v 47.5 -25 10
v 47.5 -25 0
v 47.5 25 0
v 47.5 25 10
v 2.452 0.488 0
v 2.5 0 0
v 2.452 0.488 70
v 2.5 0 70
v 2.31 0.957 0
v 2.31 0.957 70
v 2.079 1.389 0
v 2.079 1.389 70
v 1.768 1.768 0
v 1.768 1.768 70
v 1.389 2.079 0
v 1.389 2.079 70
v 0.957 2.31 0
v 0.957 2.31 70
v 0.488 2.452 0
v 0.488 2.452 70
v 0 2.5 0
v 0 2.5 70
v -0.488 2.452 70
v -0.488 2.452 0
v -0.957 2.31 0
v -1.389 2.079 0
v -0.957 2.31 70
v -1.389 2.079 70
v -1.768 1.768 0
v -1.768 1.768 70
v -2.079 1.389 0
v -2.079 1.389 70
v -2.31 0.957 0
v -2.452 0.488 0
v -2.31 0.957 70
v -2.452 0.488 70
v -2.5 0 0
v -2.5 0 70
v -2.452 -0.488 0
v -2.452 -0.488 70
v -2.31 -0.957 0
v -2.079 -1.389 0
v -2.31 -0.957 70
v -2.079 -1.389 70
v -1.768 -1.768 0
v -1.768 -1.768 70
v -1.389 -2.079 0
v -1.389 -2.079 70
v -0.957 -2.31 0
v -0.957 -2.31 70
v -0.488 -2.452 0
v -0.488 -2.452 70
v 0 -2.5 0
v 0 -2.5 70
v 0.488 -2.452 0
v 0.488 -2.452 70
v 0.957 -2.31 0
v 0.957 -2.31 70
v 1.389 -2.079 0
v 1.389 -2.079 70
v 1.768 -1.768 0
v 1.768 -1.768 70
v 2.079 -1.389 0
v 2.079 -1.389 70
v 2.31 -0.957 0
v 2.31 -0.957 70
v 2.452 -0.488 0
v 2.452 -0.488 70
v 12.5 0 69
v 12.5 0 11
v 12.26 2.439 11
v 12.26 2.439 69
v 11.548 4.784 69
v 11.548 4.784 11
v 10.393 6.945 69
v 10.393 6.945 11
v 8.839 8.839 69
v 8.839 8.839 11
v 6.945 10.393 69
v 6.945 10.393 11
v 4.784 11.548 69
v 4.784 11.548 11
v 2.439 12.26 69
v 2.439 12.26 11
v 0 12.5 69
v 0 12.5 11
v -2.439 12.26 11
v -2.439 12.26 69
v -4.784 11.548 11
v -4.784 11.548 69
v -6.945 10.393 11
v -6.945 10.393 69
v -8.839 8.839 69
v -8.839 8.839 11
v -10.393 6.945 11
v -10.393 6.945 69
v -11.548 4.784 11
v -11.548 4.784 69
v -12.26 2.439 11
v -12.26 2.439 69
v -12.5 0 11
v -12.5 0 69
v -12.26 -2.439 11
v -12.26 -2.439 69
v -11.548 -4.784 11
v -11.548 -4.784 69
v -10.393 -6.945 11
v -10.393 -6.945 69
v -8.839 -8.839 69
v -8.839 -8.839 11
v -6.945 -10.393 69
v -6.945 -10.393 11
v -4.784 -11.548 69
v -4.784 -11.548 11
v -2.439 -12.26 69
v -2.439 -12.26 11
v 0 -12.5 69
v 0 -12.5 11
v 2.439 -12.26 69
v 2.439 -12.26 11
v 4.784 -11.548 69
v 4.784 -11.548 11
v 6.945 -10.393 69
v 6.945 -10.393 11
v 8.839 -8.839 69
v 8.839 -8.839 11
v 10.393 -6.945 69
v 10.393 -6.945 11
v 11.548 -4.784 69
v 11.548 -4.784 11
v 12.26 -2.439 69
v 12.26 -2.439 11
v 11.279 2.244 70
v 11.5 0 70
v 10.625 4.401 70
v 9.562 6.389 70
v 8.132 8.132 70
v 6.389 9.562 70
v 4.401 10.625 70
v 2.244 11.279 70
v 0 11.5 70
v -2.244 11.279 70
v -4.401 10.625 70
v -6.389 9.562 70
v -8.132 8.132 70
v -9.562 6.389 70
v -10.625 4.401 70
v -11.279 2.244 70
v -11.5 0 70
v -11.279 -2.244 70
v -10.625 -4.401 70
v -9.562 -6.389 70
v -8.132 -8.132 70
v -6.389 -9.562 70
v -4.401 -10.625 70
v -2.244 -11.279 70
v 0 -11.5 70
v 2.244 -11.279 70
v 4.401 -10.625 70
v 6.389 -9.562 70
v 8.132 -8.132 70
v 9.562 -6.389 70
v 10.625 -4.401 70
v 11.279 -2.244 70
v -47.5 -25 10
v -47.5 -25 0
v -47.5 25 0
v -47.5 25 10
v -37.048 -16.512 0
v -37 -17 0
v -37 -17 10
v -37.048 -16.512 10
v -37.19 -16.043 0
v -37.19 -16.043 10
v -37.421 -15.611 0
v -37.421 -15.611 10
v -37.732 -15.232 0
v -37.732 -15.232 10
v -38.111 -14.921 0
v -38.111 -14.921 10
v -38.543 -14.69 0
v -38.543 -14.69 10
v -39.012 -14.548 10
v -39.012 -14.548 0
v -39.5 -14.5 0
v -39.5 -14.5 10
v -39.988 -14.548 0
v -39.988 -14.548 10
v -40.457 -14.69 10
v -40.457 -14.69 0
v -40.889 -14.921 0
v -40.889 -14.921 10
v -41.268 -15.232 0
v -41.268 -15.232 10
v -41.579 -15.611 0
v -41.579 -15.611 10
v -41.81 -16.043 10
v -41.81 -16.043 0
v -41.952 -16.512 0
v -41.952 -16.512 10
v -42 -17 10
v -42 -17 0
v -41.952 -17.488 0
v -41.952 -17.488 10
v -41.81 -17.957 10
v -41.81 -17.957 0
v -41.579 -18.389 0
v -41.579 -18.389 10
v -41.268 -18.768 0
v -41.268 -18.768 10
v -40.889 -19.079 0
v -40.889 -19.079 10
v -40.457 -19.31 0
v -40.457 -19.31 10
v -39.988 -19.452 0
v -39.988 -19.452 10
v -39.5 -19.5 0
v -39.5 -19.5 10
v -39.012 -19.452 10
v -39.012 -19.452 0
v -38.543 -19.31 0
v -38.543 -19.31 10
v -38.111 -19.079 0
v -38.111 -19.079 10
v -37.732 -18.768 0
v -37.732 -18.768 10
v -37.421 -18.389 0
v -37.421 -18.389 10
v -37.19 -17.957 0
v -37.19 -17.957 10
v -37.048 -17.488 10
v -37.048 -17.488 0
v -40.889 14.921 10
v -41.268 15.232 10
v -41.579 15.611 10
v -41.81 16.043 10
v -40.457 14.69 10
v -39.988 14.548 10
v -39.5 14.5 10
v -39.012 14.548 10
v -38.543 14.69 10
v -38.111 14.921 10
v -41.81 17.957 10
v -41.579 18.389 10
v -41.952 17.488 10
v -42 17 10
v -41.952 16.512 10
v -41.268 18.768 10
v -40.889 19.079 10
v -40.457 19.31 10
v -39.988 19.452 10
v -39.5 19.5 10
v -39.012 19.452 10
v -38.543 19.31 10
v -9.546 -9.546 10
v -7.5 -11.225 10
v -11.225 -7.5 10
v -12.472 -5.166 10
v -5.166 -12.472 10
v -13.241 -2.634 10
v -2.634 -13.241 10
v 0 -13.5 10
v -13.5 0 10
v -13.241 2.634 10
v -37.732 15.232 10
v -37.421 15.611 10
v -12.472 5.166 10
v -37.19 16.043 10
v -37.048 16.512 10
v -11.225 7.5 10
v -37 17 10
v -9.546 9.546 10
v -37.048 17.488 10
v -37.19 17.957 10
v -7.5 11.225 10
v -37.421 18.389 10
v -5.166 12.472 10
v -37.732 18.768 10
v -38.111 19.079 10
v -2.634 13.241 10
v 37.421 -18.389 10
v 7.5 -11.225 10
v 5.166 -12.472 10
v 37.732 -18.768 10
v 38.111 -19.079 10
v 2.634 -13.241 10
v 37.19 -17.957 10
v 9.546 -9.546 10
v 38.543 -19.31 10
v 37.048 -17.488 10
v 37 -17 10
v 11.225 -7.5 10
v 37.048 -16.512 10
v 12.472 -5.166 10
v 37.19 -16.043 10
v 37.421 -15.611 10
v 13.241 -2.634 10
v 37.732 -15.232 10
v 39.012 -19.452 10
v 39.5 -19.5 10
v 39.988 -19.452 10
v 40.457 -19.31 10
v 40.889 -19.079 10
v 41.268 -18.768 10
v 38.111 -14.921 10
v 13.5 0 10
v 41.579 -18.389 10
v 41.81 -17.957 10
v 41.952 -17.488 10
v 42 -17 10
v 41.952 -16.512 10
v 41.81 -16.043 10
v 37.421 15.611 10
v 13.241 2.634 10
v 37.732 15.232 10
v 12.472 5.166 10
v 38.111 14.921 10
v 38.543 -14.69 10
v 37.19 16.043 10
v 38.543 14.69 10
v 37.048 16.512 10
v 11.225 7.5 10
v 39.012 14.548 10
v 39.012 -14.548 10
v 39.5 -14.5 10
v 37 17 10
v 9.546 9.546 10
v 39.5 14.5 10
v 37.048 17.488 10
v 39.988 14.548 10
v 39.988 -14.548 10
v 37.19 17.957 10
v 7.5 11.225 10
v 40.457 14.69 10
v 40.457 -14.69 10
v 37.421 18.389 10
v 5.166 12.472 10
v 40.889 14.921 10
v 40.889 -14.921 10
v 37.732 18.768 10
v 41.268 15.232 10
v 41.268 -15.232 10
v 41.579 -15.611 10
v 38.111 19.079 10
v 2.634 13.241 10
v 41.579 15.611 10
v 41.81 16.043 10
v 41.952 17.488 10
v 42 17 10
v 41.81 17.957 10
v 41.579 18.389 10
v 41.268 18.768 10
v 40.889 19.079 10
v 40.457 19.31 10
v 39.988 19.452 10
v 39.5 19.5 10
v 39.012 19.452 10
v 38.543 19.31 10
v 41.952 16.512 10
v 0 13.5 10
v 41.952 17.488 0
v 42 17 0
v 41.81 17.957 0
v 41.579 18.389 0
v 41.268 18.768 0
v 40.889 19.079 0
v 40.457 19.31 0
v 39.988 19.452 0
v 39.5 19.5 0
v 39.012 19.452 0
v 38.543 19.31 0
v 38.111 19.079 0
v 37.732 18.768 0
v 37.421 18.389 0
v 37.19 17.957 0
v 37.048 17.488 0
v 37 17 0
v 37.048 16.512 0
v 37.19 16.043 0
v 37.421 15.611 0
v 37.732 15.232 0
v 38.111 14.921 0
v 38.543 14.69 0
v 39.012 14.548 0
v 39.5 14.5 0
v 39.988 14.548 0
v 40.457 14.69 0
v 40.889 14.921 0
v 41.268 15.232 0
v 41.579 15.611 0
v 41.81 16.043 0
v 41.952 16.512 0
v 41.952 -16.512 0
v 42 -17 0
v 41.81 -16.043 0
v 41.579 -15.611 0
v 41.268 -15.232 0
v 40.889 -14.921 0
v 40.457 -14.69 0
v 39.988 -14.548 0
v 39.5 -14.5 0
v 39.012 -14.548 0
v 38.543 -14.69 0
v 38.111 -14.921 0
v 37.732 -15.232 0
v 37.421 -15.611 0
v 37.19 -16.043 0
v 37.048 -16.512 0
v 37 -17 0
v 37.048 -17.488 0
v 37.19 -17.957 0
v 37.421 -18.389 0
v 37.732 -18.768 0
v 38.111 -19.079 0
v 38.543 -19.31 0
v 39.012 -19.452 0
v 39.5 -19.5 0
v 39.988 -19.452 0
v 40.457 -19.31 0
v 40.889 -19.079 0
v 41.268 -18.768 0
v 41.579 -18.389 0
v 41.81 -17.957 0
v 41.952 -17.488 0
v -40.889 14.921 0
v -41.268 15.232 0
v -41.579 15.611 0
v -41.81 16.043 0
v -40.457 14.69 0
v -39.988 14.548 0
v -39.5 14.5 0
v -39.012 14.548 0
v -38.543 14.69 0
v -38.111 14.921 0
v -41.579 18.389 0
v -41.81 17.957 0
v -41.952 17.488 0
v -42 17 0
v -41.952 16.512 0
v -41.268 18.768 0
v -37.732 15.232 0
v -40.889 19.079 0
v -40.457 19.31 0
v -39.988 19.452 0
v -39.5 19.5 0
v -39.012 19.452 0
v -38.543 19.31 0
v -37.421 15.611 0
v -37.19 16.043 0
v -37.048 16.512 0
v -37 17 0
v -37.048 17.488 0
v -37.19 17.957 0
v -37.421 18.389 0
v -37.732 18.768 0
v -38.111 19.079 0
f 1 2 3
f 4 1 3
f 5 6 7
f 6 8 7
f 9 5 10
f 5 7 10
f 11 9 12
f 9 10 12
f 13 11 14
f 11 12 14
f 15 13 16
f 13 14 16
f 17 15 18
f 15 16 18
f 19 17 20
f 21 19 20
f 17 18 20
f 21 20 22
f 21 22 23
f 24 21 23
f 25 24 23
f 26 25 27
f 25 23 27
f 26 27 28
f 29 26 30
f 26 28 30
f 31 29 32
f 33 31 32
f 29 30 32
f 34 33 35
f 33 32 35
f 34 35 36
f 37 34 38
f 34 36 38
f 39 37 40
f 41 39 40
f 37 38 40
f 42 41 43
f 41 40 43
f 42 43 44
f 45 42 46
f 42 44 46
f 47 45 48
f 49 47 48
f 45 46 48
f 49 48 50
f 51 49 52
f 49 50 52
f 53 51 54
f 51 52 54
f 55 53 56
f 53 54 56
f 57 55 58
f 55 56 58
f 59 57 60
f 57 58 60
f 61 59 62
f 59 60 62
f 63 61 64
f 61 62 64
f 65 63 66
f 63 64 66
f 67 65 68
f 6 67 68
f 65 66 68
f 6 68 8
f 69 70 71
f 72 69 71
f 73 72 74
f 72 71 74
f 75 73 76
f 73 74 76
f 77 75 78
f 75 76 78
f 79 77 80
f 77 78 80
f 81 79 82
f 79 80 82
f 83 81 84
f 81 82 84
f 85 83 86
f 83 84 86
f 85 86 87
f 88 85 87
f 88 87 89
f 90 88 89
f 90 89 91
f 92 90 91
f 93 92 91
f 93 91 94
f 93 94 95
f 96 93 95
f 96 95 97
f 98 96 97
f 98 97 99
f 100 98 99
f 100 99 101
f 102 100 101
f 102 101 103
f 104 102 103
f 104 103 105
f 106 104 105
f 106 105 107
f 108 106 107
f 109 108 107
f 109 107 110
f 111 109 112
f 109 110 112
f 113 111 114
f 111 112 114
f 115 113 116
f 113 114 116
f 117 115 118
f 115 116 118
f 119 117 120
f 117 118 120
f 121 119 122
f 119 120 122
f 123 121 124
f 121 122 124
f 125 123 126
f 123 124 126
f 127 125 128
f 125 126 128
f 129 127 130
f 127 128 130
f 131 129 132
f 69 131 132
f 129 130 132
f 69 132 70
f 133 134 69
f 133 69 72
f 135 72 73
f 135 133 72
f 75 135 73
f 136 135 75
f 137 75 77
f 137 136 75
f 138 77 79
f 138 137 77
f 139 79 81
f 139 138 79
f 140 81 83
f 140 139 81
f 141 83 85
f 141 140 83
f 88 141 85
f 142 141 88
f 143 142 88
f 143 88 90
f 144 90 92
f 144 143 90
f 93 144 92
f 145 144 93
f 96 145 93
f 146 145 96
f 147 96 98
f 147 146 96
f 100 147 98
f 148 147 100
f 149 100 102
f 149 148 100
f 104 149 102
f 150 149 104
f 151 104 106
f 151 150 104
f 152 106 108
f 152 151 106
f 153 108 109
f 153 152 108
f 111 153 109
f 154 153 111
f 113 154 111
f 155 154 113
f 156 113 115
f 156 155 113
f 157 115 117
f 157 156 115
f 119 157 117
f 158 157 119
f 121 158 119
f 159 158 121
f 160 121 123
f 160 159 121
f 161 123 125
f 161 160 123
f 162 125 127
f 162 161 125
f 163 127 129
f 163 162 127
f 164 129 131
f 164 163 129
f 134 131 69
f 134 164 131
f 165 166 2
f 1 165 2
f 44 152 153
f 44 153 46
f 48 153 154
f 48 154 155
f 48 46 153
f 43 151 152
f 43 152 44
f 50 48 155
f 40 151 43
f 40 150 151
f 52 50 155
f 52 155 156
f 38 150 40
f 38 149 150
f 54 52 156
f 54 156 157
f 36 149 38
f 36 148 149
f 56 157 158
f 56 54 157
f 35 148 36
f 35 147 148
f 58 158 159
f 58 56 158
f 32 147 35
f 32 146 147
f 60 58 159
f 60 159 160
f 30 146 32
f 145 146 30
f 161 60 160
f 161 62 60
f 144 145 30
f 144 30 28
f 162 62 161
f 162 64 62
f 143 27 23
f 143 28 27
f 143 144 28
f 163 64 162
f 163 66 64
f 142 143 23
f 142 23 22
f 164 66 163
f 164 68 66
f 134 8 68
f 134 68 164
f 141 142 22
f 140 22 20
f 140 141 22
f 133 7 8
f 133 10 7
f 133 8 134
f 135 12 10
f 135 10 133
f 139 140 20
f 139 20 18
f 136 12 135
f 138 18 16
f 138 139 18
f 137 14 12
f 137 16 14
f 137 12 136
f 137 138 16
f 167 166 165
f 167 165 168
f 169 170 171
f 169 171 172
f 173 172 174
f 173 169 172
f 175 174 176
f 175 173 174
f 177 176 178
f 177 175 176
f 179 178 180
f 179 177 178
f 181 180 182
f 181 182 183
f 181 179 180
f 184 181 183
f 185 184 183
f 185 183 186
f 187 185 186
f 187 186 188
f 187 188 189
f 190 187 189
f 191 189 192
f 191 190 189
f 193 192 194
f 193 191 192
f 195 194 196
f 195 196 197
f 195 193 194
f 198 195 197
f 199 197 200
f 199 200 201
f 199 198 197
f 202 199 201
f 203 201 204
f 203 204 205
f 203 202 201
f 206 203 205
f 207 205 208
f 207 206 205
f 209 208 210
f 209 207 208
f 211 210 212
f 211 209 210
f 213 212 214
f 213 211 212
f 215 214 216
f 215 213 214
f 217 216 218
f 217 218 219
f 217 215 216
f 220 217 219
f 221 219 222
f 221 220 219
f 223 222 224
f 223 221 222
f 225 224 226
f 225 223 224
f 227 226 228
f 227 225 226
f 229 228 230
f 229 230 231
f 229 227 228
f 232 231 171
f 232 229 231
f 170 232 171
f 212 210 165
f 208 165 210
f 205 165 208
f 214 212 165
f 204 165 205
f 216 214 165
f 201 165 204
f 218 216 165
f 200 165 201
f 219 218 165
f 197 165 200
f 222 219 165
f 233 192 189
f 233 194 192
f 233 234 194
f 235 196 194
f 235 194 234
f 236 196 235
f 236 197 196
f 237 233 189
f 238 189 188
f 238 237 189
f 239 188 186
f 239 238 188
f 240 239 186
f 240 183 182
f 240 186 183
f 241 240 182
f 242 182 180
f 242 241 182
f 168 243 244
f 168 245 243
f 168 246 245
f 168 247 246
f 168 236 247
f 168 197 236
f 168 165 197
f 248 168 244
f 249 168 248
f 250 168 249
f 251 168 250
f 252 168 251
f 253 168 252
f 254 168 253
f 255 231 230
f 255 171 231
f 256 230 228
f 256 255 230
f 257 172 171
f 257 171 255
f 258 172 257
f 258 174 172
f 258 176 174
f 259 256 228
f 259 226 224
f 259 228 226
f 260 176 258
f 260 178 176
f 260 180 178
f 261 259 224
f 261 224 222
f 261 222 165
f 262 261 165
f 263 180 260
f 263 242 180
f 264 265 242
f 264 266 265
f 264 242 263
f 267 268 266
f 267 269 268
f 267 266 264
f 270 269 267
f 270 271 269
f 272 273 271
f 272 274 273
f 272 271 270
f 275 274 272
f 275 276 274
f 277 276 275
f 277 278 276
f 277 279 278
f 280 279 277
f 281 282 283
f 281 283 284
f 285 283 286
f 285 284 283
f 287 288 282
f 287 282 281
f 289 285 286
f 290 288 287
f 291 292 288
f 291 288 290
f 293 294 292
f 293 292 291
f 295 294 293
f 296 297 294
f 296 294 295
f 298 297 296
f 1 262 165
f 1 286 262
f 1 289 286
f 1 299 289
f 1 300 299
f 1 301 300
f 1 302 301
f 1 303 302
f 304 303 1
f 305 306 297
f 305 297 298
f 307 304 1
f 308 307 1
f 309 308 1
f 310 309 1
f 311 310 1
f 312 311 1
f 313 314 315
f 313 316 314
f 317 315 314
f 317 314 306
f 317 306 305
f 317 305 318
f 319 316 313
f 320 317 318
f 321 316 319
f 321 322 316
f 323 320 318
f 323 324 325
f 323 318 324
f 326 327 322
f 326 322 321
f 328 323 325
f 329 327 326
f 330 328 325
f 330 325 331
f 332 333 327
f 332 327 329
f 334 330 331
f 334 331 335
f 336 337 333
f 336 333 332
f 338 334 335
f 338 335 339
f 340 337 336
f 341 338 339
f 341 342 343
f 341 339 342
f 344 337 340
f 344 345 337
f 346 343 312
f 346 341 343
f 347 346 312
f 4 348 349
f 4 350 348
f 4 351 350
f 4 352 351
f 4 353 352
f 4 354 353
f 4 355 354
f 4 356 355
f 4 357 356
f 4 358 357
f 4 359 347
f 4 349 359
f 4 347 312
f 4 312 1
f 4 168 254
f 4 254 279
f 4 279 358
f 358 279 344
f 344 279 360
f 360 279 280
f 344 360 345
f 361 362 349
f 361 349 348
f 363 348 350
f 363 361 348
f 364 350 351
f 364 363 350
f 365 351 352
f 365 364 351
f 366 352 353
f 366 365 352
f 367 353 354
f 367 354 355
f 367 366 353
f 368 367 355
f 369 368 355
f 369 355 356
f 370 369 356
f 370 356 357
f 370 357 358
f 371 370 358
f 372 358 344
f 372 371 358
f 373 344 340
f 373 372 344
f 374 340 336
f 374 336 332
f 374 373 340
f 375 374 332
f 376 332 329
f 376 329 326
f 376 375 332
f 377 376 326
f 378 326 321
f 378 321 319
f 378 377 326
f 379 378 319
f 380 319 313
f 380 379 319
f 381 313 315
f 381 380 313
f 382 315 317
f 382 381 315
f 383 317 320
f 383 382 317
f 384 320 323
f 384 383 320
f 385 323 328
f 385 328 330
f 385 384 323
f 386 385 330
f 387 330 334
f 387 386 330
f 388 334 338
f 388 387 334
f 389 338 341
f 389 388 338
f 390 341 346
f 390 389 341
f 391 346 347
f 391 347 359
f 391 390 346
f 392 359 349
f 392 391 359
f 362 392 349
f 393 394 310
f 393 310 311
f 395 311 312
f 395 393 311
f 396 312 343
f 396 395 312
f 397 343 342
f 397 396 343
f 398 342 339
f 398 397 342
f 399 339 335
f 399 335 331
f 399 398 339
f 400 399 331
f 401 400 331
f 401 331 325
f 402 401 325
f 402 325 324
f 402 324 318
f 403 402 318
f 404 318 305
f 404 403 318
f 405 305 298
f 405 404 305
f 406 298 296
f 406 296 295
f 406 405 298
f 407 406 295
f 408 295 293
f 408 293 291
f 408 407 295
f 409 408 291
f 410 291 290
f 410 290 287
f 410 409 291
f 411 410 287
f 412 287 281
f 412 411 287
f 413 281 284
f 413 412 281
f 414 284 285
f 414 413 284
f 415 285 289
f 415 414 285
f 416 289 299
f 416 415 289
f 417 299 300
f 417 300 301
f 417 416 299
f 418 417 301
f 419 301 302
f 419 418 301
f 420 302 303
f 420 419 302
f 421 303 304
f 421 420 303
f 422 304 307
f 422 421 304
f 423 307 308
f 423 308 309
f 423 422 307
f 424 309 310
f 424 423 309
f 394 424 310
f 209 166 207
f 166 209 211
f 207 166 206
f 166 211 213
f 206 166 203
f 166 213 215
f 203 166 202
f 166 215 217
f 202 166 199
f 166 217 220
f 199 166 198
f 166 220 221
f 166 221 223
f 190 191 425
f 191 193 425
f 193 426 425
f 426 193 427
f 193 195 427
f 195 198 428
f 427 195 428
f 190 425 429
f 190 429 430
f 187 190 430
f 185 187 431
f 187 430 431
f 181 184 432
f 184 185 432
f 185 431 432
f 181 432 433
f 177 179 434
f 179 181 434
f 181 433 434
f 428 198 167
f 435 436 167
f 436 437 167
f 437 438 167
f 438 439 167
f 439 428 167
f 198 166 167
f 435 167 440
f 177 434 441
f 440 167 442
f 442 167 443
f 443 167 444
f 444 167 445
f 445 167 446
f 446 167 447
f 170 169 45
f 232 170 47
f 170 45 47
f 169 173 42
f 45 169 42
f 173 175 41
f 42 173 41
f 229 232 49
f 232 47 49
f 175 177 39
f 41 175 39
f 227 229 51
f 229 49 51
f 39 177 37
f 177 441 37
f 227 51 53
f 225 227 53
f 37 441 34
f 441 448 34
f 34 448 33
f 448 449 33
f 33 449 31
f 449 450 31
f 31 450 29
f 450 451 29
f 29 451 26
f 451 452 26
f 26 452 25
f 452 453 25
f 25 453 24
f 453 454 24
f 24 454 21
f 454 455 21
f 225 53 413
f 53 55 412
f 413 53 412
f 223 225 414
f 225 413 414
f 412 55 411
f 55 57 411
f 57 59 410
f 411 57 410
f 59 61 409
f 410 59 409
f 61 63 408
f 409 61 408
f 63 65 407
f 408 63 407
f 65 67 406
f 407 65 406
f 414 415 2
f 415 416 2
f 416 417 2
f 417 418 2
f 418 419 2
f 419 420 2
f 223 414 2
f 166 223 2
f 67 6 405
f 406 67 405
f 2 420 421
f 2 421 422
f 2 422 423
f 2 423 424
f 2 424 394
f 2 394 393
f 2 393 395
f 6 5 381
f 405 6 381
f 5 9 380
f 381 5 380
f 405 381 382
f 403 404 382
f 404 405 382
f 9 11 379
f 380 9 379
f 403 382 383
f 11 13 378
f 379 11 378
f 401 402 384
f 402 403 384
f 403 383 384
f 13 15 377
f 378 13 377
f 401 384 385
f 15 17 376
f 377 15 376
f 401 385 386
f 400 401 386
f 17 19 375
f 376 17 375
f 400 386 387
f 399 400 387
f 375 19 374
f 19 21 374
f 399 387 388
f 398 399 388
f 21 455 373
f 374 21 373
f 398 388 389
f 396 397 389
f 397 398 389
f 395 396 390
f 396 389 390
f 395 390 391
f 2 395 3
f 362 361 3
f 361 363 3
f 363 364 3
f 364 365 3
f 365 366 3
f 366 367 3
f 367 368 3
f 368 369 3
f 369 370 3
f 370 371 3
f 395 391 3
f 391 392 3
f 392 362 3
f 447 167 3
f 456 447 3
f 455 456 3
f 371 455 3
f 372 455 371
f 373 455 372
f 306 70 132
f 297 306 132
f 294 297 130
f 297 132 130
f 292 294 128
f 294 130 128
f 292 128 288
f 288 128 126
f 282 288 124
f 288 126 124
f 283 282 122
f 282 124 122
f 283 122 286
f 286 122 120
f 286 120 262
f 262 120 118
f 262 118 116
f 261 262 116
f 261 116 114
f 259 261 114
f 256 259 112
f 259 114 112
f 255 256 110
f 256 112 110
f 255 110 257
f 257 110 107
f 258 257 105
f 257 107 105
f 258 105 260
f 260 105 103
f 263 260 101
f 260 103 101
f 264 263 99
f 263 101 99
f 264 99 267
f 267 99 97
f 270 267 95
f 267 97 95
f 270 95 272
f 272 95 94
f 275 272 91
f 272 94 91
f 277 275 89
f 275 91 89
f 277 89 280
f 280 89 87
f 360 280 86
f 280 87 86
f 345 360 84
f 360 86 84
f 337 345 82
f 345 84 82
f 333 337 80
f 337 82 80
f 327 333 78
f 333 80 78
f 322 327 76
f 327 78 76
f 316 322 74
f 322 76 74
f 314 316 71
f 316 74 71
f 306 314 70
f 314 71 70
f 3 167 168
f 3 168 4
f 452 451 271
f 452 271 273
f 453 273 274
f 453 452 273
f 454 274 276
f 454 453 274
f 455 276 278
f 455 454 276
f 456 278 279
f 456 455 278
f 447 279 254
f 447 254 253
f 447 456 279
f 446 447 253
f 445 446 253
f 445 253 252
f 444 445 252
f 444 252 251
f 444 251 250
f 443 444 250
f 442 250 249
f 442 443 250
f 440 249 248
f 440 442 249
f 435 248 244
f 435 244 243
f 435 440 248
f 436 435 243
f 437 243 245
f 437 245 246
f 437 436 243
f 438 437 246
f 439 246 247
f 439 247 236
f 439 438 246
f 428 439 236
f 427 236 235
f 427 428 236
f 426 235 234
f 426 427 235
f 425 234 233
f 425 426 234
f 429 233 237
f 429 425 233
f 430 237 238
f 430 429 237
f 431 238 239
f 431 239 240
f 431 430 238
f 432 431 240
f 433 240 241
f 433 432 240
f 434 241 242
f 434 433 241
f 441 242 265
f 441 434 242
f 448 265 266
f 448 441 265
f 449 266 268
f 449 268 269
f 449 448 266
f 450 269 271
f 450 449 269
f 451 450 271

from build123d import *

# Parameters (mm, degrees)
F0_W      = 95
F0_H      = 50
F0_R      = 2.5
F1_DEPTH  = 10
F2_R      = 12.5
F2_R_2    = 2.5
F3_DEPTH  = 70
F3_FACE_R = 2.5
F4_DEPTH  = 100
F5_SIZE   = 1


with BuildPart() as f1:
    # F0 (on Top) → F1 (new body)
    with BuildSketch(Plane.XY):
        Rectangle(F0_W, F0_H)
        with Locations((-39.5, -17)):
            Circle(F0_R, mode=Mode.SUBTRACT)
        with Locations((39.5, -17)):
            Circle(F0_R, mode=Mode.SUBTRACT)
        with Locations((-39.5, 17)):
            Circle(F0_R, mode=Mode.SUBTRACT)
        with Locations((39.5, 17)):
            Circle(F0_R, mode=Mode.SUBTRACT)
    extrude(amount=F1_DEPTH)

    # F2 (on Top) → F3 (join)
    with BuildSketch(Plane.XY):
        Circle(F2_R)
        Circle(F2_R_2, mode=Mode.SUBTRACT)
    extrude(amount=F3_DEPTH)

    # F3_face (on face) → F4 (cut)
    with BuildSketch(Plane.XY.offset(10)):
        Circle(F3_FACE_R)
    extrude(amount=-F4_DEPTH, mode=Mode.SUBTRACT)

    # F5
    f5_edges = [f1.edges().sort_by_distance(p)[0] for p in [
        (-12.5, 0, 70),
        (-12.5, 0, 10),
    ]]
    chamfer(f5_edges, length=F5_SIZE)


solid = f1.part
